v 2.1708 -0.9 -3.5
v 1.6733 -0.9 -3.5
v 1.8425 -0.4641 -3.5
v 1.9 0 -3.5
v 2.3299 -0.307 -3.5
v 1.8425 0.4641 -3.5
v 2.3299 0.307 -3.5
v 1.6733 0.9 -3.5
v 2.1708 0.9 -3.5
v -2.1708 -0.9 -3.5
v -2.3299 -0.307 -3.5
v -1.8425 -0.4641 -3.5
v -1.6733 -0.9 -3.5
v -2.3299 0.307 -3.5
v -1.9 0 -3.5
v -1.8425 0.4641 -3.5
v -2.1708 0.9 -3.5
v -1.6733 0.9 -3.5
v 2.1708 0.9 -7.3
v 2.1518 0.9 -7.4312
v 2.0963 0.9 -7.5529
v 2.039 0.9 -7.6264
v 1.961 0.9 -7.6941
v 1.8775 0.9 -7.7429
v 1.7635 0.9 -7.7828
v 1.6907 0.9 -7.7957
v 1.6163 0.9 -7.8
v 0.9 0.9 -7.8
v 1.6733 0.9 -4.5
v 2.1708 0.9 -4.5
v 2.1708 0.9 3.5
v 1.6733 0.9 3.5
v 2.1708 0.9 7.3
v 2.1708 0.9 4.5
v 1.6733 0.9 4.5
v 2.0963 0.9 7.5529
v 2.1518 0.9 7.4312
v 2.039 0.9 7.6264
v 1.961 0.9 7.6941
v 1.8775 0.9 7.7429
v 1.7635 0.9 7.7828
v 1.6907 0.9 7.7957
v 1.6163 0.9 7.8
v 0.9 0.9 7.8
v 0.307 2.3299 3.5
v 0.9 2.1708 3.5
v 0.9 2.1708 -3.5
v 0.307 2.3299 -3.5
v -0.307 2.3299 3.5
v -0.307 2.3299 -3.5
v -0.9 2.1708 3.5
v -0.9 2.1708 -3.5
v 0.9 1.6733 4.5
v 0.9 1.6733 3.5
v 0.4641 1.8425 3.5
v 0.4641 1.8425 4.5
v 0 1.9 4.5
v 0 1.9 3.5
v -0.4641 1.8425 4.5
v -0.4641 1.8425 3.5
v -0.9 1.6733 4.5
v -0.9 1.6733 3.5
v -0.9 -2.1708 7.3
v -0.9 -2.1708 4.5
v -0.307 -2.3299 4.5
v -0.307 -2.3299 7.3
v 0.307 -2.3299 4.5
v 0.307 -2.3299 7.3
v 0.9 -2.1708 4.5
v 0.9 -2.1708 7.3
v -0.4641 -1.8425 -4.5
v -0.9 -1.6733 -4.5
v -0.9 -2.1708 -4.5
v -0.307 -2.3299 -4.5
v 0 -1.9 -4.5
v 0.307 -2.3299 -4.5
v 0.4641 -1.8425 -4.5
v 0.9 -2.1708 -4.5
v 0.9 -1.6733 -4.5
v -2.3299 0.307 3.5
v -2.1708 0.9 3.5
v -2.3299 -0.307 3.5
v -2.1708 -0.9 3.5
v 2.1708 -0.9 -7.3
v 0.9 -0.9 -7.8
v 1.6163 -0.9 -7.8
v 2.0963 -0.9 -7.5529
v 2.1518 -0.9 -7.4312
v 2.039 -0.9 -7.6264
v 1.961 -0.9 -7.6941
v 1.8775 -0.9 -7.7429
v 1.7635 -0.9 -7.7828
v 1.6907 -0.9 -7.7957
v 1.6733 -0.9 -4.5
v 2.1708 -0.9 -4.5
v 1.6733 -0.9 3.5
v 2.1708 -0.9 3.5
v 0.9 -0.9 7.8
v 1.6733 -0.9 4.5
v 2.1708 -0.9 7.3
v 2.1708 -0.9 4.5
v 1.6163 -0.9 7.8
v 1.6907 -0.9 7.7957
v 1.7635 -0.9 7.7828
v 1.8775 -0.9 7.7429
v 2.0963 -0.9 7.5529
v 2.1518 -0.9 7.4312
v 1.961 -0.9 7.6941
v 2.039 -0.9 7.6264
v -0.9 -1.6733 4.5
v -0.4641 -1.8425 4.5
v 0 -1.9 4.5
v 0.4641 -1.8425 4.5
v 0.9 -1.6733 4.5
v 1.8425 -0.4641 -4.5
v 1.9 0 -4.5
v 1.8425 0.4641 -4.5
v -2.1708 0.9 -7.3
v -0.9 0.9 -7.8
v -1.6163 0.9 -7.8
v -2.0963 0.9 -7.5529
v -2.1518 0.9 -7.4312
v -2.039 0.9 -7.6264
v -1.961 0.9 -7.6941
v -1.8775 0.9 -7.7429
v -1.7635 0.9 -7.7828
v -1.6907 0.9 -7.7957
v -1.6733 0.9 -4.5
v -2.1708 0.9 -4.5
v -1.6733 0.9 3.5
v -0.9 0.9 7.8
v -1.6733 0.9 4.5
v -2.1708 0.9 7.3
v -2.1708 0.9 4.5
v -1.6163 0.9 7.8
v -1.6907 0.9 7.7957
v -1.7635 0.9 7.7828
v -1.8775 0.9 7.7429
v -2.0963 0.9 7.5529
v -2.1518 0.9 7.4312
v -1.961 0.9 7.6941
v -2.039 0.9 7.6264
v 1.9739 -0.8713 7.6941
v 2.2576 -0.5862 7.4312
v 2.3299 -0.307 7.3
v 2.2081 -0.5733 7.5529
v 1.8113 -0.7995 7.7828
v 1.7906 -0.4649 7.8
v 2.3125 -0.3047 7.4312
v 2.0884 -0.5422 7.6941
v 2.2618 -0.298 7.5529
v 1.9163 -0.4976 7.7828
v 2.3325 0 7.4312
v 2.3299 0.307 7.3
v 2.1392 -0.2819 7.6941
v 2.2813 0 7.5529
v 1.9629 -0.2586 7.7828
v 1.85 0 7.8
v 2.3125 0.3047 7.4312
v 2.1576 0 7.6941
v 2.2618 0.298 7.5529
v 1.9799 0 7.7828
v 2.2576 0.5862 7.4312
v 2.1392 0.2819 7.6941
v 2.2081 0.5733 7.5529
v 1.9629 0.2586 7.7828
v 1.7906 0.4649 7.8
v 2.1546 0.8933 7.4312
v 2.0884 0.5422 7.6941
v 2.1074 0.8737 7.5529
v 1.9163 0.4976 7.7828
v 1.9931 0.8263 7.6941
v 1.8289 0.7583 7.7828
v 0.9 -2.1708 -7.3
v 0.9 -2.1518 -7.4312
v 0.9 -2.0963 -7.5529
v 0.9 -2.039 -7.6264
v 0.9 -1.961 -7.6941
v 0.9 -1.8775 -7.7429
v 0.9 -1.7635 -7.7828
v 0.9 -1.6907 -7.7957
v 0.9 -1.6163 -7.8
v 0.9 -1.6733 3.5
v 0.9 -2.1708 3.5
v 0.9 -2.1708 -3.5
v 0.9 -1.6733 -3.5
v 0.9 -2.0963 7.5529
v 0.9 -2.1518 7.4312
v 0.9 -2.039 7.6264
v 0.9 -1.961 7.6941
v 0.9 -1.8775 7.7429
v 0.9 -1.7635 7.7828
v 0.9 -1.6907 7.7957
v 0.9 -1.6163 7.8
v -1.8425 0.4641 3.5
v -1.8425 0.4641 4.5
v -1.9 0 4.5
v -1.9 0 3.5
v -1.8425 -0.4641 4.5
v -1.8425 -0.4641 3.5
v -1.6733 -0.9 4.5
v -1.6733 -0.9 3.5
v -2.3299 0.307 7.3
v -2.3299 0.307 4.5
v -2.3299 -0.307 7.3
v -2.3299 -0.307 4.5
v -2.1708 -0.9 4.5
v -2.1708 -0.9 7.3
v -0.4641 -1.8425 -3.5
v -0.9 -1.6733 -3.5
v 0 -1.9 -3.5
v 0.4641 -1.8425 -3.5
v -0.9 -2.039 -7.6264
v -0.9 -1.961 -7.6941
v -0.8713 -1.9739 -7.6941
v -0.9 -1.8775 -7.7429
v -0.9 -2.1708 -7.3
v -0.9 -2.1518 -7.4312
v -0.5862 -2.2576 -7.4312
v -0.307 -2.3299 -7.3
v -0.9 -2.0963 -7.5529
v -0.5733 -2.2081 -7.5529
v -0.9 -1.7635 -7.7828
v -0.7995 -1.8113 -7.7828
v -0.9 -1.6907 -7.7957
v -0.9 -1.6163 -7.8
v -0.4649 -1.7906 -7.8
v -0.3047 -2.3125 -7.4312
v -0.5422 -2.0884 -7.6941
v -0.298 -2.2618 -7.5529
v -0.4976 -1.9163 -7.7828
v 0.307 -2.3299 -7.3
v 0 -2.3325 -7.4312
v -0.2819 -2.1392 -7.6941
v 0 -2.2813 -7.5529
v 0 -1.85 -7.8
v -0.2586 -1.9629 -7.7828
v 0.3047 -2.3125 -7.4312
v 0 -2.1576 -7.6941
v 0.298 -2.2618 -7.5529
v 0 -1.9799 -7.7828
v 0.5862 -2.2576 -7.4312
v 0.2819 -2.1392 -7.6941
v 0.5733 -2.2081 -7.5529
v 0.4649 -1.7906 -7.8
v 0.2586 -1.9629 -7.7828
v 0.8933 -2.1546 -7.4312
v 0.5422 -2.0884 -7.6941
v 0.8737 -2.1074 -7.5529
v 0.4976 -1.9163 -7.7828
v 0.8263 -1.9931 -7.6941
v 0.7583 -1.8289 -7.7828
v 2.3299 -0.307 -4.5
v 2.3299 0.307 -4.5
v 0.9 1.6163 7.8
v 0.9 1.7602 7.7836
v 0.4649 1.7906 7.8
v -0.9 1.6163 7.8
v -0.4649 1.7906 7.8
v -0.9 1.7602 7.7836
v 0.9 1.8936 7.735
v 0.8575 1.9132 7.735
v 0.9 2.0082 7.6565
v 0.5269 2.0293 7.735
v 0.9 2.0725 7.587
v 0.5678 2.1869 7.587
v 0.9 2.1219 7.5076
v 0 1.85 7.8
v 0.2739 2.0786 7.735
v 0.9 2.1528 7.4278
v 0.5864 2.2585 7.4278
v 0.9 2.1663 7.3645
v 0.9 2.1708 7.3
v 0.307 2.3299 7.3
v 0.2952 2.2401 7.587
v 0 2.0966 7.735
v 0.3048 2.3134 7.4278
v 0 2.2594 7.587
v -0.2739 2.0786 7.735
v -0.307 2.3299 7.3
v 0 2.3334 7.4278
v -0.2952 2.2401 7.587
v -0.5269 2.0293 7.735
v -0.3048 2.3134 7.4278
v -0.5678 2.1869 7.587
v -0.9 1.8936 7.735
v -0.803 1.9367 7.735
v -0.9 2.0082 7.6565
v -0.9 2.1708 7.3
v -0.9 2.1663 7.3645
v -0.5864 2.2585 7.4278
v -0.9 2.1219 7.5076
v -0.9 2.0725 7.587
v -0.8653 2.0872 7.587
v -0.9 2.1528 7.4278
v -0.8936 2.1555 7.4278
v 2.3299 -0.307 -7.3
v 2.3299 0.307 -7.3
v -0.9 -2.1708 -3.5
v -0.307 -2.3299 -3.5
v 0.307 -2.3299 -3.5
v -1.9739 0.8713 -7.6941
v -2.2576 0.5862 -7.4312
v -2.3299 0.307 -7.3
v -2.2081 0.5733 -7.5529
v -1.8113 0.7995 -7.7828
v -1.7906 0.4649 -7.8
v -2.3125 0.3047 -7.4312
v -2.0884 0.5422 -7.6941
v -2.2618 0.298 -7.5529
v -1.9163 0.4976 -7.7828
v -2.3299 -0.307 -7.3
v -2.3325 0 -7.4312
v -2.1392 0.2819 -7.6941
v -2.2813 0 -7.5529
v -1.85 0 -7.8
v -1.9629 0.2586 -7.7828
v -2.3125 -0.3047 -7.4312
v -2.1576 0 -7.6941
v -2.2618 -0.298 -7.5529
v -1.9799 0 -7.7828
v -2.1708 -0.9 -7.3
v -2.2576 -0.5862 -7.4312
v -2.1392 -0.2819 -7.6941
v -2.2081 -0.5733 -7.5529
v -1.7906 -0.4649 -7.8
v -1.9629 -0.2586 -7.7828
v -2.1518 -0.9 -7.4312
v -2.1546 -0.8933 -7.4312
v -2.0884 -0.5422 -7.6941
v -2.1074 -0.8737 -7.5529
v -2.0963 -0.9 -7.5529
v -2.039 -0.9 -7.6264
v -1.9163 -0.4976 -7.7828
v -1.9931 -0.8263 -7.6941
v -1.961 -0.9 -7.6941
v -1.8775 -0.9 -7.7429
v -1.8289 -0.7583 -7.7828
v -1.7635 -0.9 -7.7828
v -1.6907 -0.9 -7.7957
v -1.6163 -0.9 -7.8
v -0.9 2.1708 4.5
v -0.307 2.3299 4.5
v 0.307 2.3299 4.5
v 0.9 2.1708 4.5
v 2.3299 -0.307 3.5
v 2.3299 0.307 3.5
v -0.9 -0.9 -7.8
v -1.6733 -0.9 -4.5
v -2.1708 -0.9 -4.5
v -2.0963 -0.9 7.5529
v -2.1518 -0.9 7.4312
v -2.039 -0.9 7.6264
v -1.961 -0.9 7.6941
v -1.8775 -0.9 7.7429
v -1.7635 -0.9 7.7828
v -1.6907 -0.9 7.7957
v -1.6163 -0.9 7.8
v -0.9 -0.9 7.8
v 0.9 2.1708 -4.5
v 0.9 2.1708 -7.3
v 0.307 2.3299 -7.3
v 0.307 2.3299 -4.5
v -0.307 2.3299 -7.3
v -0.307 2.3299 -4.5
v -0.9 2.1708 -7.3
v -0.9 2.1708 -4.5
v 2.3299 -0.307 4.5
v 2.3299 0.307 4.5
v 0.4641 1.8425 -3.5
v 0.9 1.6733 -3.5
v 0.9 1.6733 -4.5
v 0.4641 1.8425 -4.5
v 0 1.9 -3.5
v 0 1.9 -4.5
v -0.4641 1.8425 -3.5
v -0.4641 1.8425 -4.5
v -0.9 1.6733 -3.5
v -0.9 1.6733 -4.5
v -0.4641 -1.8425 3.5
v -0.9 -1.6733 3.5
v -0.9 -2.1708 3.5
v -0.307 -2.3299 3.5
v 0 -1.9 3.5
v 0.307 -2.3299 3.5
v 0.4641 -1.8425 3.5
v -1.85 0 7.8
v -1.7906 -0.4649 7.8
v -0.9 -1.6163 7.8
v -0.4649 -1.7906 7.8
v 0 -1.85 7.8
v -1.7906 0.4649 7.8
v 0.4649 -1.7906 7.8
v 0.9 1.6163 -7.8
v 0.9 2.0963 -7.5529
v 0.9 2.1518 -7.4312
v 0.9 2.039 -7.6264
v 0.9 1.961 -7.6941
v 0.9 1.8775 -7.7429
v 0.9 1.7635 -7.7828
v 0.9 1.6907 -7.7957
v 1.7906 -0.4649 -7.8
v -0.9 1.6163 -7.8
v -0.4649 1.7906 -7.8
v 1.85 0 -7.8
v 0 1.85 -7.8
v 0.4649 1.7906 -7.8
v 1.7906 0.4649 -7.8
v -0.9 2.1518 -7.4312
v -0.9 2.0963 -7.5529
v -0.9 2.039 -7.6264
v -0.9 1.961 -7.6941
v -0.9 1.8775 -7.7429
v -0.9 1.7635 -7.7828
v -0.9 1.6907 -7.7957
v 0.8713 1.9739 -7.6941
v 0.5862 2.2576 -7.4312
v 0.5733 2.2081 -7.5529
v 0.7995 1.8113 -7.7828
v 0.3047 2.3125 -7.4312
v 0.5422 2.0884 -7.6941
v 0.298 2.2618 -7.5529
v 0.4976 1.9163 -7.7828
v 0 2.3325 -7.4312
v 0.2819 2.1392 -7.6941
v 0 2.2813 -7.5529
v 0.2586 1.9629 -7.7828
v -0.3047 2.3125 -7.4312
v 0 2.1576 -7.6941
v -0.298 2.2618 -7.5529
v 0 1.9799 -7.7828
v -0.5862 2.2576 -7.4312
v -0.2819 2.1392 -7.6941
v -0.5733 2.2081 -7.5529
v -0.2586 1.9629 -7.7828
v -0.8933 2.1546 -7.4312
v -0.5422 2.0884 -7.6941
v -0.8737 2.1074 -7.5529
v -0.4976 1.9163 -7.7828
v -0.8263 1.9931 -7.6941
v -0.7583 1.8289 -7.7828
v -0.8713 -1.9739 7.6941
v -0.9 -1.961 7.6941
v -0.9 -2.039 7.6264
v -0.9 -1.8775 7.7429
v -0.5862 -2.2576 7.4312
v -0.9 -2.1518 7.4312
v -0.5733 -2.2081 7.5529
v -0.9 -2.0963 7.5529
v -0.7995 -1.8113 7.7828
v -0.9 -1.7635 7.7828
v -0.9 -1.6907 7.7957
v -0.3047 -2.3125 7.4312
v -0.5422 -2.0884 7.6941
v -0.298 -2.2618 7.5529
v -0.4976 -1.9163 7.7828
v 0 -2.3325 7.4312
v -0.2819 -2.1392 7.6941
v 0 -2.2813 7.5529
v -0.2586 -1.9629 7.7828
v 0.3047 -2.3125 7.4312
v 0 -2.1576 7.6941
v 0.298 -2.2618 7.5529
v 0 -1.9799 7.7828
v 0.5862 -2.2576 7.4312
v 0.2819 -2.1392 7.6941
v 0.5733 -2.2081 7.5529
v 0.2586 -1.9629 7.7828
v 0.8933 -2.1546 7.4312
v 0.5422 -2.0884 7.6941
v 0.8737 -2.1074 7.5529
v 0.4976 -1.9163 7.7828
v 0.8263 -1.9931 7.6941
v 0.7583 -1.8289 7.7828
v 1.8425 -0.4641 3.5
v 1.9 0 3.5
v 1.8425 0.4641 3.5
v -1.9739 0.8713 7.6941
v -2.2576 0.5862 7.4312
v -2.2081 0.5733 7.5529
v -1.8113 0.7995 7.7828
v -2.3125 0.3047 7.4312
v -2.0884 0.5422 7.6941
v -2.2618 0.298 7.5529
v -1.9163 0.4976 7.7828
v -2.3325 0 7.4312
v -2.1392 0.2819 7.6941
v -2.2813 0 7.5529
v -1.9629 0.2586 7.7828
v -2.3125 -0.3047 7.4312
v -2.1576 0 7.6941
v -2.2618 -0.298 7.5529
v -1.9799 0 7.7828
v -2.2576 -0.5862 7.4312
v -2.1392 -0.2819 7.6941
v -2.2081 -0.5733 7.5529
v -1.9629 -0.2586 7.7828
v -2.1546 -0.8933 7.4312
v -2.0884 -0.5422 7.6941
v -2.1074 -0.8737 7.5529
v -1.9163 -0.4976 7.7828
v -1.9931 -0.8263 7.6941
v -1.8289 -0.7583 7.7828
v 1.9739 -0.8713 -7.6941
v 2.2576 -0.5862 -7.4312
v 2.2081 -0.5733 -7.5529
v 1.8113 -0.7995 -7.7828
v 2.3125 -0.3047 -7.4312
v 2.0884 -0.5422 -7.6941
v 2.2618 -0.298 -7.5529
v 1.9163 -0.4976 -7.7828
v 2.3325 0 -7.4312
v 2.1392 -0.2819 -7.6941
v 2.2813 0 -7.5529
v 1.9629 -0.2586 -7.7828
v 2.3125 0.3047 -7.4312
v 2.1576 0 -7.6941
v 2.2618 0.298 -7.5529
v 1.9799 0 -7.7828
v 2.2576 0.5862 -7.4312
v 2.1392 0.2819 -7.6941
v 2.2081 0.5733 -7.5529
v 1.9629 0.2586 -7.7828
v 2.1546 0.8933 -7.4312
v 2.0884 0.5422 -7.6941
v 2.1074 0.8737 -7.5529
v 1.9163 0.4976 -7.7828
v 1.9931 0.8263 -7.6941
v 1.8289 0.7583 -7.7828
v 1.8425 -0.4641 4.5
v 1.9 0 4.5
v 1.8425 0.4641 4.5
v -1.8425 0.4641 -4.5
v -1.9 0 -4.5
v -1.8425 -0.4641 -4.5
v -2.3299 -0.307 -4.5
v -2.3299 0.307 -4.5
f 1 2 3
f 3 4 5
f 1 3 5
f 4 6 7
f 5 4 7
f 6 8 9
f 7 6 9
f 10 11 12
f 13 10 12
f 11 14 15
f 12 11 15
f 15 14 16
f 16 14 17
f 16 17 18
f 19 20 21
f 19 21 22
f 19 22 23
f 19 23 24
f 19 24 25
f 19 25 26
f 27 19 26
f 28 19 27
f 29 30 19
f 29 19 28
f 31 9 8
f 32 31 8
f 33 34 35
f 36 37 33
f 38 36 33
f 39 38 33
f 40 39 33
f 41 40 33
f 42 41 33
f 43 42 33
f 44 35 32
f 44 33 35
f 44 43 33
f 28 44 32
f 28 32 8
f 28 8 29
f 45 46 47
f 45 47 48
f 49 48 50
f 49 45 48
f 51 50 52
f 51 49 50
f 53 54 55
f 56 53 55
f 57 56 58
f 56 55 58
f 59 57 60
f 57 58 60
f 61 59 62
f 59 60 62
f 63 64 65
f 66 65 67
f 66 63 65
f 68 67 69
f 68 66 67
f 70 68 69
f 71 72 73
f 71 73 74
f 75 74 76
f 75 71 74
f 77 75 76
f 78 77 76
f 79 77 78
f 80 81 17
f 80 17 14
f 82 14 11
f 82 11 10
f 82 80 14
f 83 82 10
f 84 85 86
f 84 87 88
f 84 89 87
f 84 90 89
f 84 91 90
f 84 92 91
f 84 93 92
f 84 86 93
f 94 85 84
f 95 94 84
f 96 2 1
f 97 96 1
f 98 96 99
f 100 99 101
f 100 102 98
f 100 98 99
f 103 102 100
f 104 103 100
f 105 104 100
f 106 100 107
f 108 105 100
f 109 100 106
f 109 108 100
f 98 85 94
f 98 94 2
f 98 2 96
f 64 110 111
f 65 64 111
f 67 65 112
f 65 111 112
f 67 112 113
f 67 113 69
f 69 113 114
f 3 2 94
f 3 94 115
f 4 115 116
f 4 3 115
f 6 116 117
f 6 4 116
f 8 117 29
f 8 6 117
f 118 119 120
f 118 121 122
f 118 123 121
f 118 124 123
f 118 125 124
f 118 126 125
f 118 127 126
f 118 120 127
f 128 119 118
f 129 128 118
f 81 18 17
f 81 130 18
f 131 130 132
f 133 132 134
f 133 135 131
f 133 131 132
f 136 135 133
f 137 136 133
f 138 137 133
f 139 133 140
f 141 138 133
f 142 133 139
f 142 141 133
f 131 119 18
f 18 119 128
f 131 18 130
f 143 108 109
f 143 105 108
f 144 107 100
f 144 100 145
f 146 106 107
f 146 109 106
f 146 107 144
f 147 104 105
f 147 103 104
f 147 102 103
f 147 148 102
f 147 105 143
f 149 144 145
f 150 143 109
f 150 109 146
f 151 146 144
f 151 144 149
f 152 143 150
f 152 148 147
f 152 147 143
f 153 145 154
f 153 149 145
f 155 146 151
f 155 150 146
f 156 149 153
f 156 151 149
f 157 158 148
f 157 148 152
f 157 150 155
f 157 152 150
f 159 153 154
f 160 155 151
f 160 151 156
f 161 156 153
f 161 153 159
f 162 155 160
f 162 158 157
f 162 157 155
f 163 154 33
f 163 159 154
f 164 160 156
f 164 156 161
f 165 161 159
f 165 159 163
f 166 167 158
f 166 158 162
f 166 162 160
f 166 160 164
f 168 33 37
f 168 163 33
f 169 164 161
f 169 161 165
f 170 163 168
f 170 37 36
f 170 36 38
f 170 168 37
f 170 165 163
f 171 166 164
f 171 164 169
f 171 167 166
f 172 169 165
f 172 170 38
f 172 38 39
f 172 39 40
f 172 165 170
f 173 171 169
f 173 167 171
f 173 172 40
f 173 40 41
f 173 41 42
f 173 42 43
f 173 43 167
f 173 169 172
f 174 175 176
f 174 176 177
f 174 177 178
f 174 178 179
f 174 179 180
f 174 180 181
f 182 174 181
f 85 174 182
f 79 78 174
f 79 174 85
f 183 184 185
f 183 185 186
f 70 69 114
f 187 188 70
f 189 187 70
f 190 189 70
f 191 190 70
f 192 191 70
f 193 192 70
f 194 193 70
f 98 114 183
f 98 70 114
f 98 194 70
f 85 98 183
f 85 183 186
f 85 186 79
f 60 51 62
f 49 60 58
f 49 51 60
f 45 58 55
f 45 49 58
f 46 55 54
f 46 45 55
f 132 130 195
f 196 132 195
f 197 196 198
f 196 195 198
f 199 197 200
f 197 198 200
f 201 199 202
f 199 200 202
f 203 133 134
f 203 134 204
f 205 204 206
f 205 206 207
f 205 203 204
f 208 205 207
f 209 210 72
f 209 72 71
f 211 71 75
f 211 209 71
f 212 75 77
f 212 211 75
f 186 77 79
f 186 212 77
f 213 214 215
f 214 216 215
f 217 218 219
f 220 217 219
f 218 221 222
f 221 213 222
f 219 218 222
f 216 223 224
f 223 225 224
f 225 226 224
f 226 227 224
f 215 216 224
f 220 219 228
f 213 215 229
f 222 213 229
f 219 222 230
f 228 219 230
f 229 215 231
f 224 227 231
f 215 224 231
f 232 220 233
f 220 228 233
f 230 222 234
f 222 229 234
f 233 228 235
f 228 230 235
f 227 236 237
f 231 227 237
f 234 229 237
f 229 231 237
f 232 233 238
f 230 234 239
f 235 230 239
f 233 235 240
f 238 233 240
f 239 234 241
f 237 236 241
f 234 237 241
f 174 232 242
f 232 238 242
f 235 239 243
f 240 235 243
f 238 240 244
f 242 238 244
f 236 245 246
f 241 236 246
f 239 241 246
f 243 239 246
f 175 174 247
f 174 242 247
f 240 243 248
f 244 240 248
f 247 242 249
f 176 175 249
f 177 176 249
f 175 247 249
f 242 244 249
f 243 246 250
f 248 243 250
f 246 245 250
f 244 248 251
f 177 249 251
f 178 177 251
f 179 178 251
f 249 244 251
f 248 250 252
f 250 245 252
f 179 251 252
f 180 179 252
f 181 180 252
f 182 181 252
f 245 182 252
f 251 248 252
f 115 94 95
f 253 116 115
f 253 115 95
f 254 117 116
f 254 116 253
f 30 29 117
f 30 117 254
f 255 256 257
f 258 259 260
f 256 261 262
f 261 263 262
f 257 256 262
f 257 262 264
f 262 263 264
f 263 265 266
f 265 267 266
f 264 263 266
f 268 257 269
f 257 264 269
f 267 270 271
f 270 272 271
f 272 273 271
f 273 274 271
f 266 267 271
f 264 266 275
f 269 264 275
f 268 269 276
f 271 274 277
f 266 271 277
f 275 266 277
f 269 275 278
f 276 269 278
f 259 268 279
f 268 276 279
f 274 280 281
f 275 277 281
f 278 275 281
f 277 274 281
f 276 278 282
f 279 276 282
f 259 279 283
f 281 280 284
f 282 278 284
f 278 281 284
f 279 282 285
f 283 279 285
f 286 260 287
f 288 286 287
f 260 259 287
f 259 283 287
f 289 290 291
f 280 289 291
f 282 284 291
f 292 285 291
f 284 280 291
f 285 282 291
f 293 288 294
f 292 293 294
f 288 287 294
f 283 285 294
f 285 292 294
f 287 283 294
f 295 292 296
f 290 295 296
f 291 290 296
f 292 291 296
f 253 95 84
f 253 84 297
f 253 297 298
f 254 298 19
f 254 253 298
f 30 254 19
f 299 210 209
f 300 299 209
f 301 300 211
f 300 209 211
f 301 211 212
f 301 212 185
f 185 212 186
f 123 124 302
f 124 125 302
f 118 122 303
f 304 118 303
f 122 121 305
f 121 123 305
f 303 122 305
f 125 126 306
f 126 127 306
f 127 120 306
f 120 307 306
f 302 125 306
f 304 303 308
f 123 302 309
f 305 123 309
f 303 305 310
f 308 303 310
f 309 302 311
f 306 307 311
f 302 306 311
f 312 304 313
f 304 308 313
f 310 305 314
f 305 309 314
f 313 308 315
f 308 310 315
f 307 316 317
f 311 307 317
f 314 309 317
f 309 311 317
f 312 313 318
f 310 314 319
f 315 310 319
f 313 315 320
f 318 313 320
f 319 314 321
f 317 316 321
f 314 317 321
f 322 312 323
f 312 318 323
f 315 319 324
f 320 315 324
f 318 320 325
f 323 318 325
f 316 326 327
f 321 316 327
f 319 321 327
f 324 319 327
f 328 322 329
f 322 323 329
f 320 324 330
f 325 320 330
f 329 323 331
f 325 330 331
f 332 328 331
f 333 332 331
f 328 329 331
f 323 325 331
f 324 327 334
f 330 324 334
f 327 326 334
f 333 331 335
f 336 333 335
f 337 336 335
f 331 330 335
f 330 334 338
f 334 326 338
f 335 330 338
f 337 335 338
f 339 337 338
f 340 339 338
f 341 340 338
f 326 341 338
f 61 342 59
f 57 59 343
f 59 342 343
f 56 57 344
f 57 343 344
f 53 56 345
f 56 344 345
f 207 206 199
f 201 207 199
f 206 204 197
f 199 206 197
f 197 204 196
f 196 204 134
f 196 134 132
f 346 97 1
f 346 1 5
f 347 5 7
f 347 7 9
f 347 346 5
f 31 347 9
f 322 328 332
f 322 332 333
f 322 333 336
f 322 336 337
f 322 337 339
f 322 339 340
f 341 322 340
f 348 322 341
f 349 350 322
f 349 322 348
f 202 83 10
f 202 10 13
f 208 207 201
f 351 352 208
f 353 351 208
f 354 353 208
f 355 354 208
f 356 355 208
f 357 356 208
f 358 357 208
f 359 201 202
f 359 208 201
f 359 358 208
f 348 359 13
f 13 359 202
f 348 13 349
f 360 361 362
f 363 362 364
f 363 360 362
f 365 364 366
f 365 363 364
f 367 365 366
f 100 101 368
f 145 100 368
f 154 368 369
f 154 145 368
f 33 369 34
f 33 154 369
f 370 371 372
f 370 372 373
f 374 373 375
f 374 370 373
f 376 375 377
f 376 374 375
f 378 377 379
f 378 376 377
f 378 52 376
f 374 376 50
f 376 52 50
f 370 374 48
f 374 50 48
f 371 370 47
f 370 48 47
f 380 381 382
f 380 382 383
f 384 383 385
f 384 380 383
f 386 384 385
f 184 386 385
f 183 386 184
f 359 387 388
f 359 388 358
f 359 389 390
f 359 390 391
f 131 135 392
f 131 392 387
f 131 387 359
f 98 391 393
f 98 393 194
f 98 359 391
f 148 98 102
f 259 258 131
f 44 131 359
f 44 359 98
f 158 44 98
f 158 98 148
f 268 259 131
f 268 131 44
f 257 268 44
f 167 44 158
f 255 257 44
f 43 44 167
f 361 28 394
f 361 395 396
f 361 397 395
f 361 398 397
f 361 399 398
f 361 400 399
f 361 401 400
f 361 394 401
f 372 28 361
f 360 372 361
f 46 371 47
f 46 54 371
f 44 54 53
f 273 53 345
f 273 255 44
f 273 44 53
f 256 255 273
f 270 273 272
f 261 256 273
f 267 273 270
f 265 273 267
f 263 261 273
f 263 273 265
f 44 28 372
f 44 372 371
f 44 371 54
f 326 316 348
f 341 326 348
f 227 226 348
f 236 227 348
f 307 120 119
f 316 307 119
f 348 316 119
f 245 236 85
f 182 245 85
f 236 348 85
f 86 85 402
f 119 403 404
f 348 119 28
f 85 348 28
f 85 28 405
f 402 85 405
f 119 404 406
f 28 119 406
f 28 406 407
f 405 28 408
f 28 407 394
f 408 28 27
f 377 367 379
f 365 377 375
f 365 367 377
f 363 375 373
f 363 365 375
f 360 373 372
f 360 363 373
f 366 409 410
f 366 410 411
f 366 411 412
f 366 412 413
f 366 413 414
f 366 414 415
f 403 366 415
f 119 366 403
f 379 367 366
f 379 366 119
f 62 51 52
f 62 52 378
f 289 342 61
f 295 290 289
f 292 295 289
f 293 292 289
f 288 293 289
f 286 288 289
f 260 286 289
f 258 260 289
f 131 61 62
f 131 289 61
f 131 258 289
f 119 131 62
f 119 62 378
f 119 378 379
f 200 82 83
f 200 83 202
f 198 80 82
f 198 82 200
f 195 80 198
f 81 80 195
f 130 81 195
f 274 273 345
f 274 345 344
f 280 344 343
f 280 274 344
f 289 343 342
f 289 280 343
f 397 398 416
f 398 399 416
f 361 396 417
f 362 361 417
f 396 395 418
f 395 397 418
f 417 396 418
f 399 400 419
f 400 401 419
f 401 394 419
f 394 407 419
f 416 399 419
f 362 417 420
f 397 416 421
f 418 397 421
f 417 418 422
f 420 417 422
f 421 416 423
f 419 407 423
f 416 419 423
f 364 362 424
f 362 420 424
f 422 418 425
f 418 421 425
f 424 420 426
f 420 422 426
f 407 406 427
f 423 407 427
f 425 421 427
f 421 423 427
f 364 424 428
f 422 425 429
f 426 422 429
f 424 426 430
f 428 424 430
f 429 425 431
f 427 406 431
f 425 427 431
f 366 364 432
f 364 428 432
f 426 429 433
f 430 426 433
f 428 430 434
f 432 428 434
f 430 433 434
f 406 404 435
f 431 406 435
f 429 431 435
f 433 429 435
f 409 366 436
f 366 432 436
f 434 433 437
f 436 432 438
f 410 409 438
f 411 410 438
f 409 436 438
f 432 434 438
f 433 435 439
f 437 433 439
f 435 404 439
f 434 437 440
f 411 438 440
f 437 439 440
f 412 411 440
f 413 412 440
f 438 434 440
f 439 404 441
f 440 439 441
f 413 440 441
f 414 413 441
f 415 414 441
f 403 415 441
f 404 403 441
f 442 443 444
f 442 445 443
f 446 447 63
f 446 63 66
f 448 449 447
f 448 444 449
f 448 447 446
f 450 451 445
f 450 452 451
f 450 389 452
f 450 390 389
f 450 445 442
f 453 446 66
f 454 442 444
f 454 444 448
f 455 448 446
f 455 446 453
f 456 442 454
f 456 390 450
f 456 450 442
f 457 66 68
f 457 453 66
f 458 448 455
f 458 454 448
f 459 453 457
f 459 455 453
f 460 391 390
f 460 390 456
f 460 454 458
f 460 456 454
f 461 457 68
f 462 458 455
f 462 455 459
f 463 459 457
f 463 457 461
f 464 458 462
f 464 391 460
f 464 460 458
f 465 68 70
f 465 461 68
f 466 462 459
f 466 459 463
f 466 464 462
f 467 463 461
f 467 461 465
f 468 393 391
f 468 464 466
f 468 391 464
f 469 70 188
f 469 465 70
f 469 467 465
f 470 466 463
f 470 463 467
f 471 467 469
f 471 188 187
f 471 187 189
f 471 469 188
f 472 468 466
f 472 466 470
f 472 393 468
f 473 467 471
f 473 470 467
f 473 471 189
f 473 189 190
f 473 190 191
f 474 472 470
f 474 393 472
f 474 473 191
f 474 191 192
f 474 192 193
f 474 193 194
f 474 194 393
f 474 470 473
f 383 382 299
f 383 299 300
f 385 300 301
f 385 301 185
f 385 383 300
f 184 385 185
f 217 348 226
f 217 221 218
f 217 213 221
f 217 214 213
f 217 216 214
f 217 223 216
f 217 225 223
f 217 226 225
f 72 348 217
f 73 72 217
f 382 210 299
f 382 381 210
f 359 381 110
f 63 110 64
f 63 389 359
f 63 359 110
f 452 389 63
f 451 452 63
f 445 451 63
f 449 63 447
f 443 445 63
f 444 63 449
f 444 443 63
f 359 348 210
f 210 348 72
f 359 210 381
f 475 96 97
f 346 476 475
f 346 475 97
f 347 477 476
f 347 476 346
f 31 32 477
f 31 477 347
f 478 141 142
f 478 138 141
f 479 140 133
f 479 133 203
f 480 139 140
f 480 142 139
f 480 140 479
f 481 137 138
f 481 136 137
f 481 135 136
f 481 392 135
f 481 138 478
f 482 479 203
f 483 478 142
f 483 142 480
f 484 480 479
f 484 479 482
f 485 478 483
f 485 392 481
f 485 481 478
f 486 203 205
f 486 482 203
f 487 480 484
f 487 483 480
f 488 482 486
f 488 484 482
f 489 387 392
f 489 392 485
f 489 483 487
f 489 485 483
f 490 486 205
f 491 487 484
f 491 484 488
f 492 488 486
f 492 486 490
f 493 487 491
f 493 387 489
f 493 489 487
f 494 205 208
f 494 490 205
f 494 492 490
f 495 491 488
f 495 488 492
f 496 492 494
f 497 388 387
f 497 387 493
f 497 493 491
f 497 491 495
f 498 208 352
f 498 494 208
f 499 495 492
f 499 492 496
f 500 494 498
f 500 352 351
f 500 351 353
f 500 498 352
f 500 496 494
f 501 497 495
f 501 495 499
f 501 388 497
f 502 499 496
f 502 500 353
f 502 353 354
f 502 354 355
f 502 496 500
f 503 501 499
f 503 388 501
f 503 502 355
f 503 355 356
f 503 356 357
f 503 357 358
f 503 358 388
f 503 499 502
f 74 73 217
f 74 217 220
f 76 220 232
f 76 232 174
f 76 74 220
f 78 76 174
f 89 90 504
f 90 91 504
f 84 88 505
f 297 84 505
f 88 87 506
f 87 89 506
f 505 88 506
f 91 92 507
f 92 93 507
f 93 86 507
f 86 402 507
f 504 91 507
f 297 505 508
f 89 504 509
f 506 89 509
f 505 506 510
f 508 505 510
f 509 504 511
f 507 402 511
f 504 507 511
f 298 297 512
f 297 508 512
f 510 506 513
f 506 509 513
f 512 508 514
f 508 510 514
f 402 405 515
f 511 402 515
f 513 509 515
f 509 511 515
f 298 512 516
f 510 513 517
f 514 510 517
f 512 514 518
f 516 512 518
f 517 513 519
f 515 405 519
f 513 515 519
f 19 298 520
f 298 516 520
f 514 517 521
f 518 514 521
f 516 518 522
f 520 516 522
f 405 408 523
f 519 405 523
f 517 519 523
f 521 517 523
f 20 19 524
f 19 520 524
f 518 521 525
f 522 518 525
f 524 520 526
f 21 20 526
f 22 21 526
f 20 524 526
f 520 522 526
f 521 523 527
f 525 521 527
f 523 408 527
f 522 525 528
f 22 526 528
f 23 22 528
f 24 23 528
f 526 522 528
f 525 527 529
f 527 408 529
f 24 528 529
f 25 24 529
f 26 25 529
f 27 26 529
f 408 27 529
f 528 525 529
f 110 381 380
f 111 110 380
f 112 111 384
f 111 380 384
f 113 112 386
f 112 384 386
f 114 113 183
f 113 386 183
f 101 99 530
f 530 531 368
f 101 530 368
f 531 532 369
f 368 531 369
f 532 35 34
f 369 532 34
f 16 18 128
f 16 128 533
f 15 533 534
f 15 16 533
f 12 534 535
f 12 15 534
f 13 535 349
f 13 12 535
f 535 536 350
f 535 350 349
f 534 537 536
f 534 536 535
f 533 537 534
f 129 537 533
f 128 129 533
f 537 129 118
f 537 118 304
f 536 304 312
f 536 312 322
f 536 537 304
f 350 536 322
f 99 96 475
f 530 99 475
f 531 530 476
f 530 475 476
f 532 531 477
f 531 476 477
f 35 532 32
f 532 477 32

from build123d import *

# Parameters (mm, degrees)
BOSS_EXTRUDE1_DEPTH = 7.8
FILLET1_R           = 0.5
SIDE_START          = 3.5
SKETCH2_OUTSIDE_W   = 10.092
SKETCH2_OUTSIDE_H   = 10.092
SKETCH2_OUTSIDE_R   = 1.9
SIDE_CUT_DEPTH      = 1


with BuildPart() as part:
    # Sketch1 → Boss-Extrude1 (new, symmetric)
    with BuildSketch(Plane.XY):
        with BuildLine():
            Line((-0.9000000000000004, 0.9), (0.8999999999999999, 0.9000000000000002))
            Line((0.8999999999999998, 0.9000000000000004), (0.8999999999999998, 2.1708293346092873))
            ThreePointArc((0.8999999999999373, 2.170829334609268), (0.45883061344477144, 2.3047721076422936), (-1.386e-14, 2.3500000000000014))
            ThreePointArc((-1.386e-14, 2.3500000000000014), (-0.45883061344483045, 2.3047721076422825), (-0.9000000000000228, 2.170829334609233))
            Line((-0.9000000000000002, 2.170829334609226), (-0.9000000000000002, 0.8999999999999999))
        make_face()
        with BuildLine():
            Line((0.8999999999999998, 0.9000000000000004), (0.8999999999999998, -0.8999999999999999))
            Line((0.8999999999999999, -0.8999999999999998), (2.170829334609184, -0.8999999999999996))
            ThreePointArc((2.170829334609208, -0.9000000000000794), (2.304772107642276, -0.4588306134448533), (2.35, 2.9e-16))
            ThreePointArc((2.35, 8.7e-16), (2.3047721076422767, 0.4588306134448523), (2.1708293346092096, 0.9000000000000766))
            Line((2.170829334609186, 0.9000000000000004), (0.8999999999999999, 0.9000000000000002))
        make_face()
        with BuildLine():
            ThreePointArc((-0.9000000000000248, -2.1708293346092304), (-0.4588306134448299, -2.3047721076422807), (-1.13e-14, -2.3499999999999996))
            ThreePointArc((-1.13e-14, -2.3499999999999996), (0.45883061344477294, -2.304772107642292), (0.8999999999999382, -2.170829334609266))
            Line((0.8999999999999998, -2.1708293346092846), (0.8999999999999998, -0.8999999999999999))
            Line((0.8999999999999999, -0.8999999999999998), (-0.9000000000000004, -0.8999999999999999))
            Line((-0.9000000000000002, -0.8999999999999999), (-0.9000000000000002, -2.1708293346092233))
        make_face()
        with BuildLine():
            Line((-2.1708293346092815, -0.9000000000000001), (-0.9000000000000004, -0.8999999999999999))
            Line((-0.9000000000000002, -0.8999999999999999), (-0.9000000000000002, 0.8999999999999999))
            Line((-0.9000000000000004, 0.9), (-2.1708293346092815, 0.8999999999999999))
            ThreePointArc((-2.170829334609265, 0.8999999999999461), (-2.3047721076422913, 0.45883061344478315), (-2.350000000000001, 1.16e-15))
            ThreePointArc((-2.350000000000001, 1.16e-15), (-2.3047721076422913, -0.4588306134447819), (-2.170829334609264, -0.8999999999999455))
        make_face()
        Polygon((-0.9000000000000004, -0.8999999999999999), (0.8999999999999999, -0.8999999999999998), (0.8999999999999998, 0.9000000000000004), (-0.9000000000000004, 0.9), align=None)
    extrude(amount=BOSS_EXTRUDE1_DEPTH, both=True)

    # Fillet1
    fillet1_edges = [part.edges().sort_by_distance(p)[0] for p in [
        (-2.955e-14, 2.3500000000000014, 7.8),
        (2.3500000000000005, -9.3e-16, -7.8),
        (-2.982e-14, -2.3499999999999996, -7.8),
        (-2.350000000000001, 4.4e-16, -7.8),
        (-2.92e-14, 2.3500000000000014, -7.8),
        (-2.350000000000001, 2.2e-16, 7.8),
        (-2.943e-14, -2.3499999999999996, 7.8),
        (2.3499999999999996, -4.6e-16, 7.8),
    ]]
    fillet(fillet1_edges, radius=FILLET1_R)

    # Sketch2 outside → Side Cut (cut)
    with BuildSketch(Plane.XY.offset(SIDE_START)):
        Rectangle(SKETCH2_OUTSIDE_W, SKETCH2_OUTSIDE_H)
        Circle(SKETCH2_OUTSIDE_R, mode=Mode.SUBTRACT)
    side_cut = extrude(amount=SIDE_CUT_DEPTH, mode=Mode.SUBTRACT)

    # Mirror1: Side Cut across plane
    add(side_cut.mirror(Plane.XY), mode=Mode.SUBTRACT)


solid = part.part
